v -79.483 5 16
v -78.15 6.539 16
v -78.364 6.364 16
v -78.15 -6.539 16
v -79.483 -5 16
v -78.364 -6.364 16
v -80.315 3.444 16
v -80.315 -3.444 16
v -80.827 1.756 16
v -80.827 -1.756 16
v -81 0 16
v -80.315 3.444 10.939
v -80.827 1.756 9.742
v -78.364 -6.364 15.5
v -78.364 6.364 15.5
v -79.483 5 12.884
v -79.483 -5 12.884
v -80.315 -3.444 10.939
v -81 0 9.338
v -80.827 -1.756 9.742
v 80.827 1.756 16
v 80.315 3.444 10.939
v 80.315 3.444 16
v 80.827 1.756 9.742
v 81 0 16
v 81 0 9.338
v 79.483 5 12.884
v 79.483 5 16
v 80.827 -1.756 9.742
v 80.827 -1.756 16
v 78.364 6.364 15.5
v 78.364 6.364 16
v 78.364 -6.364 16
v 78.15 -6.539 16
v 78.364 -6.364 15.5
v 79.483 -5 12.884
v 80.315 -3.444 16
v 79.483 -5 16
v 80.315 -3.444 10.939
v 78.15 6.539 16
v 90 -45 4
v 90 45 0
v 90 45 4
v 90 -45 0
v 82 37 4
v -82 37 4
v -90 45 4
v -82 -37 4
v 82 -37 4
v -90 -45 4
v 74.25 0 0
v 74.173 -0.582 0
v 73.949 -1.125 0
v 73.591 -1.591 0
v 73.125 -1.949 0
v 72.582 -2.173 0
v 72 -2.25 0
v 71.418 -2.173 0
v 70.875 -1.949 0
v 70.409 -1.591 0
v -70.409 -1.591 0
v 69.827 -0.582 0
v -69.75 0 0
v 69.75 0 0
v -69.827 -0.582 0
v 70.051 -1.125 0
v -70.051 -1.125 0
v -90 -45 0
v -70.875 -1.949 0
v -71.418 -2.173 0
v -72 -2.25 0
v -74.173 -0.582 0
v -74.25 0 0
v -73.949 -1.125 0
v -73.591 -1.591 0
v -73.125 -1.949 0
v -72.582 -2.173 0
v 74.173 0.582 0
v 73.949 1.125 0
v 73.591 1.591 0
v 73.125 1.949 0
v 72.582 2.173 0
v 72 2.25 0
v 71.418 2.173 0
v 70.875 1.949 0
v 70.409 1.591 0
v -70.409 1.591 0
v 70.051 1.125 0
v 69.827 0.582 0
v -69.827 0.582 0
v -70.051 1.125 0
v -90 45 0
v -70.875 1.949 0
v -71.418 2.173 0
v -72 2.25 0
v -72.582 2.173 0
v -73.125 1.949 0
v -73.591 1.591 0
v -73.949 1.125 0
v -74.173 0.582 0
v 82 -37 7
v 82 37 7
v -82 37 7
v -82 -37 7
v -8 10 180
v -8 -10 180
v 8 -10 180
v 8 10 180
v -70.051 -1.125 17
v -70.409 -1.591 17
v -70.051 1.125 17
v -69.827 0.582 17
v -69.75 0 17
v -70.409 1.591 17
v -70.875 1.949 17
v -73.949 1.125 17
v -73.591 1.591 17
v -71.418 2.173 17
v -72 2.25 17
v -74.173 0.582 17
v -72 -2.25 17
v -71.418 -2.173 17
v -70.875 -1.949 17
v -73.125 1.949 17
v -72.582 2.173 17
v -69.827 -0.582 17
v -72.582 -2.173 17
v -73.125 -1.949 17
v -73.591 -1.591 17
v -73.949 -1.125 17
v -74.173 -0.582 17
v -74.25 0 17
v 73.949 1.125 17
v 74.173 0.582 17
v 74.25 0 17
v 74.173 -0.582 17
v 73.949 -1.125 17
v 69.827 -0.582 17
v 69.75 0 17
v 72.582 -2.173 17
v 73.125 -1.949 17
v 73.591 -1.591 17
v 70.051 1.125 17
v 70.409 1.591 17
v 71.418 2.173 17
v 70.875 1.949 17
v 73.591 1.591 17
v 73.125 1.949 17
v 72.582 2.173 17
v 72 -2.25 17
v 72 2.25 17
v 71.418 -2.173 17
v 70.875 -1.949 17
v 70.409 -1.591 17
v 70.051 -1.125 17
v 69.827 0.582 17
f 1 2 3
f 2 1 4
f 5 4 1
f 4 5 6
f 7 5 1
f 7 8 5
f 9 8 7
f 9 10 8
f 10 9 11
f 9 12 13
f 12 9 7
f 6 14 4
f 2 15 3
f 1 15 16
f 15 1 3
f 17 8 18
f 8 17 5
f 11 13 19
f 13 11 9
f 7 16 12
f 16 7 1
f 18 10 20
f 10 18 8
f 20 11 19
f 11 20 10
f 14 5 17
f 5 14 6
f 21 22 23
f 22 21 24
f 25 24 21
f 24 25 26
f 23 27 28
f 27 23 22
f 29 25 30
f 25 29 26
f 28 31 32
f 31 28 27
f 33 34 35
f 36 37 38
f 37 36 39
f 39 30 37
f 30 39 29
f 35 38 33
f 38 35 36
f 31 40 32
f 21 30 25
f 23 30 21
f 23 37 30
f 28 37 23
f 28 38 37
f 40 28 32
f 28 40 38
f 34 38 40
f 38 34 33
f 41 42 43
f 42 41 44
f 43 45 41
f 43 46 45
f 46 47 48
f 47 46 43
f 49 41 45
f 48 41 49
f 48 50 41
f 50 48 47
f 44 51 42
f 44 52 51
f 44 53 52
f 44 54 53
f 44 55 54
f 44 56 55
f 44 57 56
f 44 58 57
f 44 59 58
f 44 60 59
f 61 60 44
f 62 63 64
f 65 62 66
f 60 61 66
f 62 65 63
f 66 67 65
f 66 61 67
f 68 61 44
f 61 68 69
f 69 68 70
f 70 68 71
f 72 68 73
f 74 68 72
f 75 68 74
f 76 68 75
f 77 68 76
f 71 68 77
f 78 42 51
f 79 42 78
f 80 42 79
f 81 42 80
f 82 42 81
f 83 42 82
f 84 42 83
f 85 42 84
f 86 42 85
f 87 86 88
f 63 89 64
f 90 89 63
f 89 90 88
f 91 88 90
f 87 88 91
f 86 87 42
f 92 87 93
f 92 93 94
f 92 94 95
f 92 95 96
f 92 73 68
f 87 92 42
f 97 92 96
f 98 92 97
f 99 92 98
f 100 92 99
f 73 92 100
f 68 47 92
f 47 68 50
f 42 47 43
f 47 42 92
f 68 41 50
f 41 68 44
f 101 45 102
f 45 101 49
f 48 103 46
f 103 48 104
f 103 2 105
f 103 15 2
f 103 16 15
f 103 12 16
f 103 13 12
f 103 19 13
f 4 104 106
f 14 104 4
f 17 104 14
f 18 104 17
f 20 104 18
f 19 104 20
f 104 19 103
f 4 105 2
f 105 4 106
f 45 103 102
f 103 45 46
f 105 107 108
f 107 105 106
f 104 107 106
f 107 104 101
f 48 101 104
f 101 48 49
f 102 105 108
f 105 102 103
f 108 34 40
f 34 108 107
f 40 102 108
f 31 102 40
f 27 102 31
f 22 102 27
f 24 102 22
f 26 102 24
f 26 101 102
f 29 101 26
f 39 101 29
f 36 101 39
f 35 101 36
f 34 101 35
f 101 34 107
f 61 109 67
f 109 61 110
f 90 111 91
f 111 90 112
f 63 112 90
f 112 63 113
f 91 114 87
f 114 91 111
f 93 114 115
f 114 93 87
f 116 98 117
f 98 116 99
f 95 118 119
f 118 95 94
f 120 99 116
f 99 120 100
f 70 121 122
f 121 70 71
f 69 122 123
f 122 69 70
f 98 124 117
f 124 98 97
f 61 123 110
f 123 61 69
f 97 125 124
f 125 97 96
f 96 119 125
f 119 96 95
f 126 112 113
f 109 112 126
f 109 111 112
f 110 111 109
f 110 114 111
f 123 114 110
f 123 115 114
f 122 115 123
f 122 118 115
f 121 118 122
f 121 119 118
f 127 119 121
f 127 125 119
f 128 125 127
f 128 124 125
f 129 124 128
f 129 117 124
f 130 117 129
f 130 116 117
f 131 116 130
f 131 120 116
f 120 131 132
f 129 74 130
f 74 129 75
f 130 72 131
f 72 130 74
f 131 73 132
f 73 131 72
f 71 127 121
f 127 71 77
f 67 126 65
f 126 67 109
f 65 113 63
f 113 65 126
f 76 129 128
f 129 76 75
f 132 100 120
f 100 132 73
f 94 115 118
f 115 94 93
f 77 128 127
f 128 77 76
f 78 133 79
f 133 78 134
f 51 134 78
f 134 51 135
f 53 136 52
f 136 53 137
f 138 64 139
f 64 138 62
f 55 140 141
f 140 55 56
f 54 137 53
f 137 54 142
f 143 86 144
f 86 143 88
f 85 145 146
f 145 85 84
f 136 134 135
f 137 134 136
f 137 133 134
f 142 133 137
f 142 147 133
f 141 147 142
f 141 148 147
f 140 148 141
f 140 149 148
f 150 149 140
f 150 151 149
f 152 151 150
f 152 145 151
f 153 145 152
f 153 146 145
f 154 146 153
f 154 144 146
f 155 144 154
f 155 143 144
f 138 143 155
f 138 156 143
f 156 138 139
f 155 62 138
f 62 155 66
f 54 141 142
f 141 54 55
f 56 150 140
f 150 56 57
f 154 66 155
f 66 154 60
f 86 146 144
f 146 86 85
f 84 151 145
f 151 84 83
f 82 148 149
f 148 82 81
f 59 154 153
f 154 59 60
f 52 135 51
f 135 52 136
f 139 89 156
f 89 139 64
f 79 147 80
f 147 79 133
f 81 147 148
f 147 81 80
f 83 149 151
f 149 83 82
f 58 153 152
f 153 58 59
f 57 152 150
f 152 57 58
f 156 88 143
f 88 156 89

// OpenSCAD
// file: ../models/drone-playground-split-wedge/model.scad
wedge_length=180; wedge_width=90; wedge_height=180; base_thickness=4; mount_hole_diameter=4.5;
module split_wedge(){ difference(){ union(){ translate([-wedge_length/2,-wedge_width/2,0]) cube([wedge_length,wedge_width,base_thickness]); hull(){ translate([-wedge_length/2+8,-wedge_width/2+8,base_thickness]) cube([wedge_length-16,wedge_width-16,3]); translate([-8,-10,wedge_height-10]) cube([16,20,10]); } for(x=[-72,72]) translate([x,0,base_thickness]) cylinder(d=18,h=12,$fn=32); } for(x=[-72,72]) translate([x,0,-1]) cylinder(d=mount_hole_diameter,h=18,$fn=24); }}
assert(wedge_height==180 && wedge_length==180); echo("SCADCTL_REQUIREMENT:parameters:PASS"); split_wedge();
// main file
use <../models/drone-playground-split-wedge/model.scad>
color("tomato") split_wedge();
